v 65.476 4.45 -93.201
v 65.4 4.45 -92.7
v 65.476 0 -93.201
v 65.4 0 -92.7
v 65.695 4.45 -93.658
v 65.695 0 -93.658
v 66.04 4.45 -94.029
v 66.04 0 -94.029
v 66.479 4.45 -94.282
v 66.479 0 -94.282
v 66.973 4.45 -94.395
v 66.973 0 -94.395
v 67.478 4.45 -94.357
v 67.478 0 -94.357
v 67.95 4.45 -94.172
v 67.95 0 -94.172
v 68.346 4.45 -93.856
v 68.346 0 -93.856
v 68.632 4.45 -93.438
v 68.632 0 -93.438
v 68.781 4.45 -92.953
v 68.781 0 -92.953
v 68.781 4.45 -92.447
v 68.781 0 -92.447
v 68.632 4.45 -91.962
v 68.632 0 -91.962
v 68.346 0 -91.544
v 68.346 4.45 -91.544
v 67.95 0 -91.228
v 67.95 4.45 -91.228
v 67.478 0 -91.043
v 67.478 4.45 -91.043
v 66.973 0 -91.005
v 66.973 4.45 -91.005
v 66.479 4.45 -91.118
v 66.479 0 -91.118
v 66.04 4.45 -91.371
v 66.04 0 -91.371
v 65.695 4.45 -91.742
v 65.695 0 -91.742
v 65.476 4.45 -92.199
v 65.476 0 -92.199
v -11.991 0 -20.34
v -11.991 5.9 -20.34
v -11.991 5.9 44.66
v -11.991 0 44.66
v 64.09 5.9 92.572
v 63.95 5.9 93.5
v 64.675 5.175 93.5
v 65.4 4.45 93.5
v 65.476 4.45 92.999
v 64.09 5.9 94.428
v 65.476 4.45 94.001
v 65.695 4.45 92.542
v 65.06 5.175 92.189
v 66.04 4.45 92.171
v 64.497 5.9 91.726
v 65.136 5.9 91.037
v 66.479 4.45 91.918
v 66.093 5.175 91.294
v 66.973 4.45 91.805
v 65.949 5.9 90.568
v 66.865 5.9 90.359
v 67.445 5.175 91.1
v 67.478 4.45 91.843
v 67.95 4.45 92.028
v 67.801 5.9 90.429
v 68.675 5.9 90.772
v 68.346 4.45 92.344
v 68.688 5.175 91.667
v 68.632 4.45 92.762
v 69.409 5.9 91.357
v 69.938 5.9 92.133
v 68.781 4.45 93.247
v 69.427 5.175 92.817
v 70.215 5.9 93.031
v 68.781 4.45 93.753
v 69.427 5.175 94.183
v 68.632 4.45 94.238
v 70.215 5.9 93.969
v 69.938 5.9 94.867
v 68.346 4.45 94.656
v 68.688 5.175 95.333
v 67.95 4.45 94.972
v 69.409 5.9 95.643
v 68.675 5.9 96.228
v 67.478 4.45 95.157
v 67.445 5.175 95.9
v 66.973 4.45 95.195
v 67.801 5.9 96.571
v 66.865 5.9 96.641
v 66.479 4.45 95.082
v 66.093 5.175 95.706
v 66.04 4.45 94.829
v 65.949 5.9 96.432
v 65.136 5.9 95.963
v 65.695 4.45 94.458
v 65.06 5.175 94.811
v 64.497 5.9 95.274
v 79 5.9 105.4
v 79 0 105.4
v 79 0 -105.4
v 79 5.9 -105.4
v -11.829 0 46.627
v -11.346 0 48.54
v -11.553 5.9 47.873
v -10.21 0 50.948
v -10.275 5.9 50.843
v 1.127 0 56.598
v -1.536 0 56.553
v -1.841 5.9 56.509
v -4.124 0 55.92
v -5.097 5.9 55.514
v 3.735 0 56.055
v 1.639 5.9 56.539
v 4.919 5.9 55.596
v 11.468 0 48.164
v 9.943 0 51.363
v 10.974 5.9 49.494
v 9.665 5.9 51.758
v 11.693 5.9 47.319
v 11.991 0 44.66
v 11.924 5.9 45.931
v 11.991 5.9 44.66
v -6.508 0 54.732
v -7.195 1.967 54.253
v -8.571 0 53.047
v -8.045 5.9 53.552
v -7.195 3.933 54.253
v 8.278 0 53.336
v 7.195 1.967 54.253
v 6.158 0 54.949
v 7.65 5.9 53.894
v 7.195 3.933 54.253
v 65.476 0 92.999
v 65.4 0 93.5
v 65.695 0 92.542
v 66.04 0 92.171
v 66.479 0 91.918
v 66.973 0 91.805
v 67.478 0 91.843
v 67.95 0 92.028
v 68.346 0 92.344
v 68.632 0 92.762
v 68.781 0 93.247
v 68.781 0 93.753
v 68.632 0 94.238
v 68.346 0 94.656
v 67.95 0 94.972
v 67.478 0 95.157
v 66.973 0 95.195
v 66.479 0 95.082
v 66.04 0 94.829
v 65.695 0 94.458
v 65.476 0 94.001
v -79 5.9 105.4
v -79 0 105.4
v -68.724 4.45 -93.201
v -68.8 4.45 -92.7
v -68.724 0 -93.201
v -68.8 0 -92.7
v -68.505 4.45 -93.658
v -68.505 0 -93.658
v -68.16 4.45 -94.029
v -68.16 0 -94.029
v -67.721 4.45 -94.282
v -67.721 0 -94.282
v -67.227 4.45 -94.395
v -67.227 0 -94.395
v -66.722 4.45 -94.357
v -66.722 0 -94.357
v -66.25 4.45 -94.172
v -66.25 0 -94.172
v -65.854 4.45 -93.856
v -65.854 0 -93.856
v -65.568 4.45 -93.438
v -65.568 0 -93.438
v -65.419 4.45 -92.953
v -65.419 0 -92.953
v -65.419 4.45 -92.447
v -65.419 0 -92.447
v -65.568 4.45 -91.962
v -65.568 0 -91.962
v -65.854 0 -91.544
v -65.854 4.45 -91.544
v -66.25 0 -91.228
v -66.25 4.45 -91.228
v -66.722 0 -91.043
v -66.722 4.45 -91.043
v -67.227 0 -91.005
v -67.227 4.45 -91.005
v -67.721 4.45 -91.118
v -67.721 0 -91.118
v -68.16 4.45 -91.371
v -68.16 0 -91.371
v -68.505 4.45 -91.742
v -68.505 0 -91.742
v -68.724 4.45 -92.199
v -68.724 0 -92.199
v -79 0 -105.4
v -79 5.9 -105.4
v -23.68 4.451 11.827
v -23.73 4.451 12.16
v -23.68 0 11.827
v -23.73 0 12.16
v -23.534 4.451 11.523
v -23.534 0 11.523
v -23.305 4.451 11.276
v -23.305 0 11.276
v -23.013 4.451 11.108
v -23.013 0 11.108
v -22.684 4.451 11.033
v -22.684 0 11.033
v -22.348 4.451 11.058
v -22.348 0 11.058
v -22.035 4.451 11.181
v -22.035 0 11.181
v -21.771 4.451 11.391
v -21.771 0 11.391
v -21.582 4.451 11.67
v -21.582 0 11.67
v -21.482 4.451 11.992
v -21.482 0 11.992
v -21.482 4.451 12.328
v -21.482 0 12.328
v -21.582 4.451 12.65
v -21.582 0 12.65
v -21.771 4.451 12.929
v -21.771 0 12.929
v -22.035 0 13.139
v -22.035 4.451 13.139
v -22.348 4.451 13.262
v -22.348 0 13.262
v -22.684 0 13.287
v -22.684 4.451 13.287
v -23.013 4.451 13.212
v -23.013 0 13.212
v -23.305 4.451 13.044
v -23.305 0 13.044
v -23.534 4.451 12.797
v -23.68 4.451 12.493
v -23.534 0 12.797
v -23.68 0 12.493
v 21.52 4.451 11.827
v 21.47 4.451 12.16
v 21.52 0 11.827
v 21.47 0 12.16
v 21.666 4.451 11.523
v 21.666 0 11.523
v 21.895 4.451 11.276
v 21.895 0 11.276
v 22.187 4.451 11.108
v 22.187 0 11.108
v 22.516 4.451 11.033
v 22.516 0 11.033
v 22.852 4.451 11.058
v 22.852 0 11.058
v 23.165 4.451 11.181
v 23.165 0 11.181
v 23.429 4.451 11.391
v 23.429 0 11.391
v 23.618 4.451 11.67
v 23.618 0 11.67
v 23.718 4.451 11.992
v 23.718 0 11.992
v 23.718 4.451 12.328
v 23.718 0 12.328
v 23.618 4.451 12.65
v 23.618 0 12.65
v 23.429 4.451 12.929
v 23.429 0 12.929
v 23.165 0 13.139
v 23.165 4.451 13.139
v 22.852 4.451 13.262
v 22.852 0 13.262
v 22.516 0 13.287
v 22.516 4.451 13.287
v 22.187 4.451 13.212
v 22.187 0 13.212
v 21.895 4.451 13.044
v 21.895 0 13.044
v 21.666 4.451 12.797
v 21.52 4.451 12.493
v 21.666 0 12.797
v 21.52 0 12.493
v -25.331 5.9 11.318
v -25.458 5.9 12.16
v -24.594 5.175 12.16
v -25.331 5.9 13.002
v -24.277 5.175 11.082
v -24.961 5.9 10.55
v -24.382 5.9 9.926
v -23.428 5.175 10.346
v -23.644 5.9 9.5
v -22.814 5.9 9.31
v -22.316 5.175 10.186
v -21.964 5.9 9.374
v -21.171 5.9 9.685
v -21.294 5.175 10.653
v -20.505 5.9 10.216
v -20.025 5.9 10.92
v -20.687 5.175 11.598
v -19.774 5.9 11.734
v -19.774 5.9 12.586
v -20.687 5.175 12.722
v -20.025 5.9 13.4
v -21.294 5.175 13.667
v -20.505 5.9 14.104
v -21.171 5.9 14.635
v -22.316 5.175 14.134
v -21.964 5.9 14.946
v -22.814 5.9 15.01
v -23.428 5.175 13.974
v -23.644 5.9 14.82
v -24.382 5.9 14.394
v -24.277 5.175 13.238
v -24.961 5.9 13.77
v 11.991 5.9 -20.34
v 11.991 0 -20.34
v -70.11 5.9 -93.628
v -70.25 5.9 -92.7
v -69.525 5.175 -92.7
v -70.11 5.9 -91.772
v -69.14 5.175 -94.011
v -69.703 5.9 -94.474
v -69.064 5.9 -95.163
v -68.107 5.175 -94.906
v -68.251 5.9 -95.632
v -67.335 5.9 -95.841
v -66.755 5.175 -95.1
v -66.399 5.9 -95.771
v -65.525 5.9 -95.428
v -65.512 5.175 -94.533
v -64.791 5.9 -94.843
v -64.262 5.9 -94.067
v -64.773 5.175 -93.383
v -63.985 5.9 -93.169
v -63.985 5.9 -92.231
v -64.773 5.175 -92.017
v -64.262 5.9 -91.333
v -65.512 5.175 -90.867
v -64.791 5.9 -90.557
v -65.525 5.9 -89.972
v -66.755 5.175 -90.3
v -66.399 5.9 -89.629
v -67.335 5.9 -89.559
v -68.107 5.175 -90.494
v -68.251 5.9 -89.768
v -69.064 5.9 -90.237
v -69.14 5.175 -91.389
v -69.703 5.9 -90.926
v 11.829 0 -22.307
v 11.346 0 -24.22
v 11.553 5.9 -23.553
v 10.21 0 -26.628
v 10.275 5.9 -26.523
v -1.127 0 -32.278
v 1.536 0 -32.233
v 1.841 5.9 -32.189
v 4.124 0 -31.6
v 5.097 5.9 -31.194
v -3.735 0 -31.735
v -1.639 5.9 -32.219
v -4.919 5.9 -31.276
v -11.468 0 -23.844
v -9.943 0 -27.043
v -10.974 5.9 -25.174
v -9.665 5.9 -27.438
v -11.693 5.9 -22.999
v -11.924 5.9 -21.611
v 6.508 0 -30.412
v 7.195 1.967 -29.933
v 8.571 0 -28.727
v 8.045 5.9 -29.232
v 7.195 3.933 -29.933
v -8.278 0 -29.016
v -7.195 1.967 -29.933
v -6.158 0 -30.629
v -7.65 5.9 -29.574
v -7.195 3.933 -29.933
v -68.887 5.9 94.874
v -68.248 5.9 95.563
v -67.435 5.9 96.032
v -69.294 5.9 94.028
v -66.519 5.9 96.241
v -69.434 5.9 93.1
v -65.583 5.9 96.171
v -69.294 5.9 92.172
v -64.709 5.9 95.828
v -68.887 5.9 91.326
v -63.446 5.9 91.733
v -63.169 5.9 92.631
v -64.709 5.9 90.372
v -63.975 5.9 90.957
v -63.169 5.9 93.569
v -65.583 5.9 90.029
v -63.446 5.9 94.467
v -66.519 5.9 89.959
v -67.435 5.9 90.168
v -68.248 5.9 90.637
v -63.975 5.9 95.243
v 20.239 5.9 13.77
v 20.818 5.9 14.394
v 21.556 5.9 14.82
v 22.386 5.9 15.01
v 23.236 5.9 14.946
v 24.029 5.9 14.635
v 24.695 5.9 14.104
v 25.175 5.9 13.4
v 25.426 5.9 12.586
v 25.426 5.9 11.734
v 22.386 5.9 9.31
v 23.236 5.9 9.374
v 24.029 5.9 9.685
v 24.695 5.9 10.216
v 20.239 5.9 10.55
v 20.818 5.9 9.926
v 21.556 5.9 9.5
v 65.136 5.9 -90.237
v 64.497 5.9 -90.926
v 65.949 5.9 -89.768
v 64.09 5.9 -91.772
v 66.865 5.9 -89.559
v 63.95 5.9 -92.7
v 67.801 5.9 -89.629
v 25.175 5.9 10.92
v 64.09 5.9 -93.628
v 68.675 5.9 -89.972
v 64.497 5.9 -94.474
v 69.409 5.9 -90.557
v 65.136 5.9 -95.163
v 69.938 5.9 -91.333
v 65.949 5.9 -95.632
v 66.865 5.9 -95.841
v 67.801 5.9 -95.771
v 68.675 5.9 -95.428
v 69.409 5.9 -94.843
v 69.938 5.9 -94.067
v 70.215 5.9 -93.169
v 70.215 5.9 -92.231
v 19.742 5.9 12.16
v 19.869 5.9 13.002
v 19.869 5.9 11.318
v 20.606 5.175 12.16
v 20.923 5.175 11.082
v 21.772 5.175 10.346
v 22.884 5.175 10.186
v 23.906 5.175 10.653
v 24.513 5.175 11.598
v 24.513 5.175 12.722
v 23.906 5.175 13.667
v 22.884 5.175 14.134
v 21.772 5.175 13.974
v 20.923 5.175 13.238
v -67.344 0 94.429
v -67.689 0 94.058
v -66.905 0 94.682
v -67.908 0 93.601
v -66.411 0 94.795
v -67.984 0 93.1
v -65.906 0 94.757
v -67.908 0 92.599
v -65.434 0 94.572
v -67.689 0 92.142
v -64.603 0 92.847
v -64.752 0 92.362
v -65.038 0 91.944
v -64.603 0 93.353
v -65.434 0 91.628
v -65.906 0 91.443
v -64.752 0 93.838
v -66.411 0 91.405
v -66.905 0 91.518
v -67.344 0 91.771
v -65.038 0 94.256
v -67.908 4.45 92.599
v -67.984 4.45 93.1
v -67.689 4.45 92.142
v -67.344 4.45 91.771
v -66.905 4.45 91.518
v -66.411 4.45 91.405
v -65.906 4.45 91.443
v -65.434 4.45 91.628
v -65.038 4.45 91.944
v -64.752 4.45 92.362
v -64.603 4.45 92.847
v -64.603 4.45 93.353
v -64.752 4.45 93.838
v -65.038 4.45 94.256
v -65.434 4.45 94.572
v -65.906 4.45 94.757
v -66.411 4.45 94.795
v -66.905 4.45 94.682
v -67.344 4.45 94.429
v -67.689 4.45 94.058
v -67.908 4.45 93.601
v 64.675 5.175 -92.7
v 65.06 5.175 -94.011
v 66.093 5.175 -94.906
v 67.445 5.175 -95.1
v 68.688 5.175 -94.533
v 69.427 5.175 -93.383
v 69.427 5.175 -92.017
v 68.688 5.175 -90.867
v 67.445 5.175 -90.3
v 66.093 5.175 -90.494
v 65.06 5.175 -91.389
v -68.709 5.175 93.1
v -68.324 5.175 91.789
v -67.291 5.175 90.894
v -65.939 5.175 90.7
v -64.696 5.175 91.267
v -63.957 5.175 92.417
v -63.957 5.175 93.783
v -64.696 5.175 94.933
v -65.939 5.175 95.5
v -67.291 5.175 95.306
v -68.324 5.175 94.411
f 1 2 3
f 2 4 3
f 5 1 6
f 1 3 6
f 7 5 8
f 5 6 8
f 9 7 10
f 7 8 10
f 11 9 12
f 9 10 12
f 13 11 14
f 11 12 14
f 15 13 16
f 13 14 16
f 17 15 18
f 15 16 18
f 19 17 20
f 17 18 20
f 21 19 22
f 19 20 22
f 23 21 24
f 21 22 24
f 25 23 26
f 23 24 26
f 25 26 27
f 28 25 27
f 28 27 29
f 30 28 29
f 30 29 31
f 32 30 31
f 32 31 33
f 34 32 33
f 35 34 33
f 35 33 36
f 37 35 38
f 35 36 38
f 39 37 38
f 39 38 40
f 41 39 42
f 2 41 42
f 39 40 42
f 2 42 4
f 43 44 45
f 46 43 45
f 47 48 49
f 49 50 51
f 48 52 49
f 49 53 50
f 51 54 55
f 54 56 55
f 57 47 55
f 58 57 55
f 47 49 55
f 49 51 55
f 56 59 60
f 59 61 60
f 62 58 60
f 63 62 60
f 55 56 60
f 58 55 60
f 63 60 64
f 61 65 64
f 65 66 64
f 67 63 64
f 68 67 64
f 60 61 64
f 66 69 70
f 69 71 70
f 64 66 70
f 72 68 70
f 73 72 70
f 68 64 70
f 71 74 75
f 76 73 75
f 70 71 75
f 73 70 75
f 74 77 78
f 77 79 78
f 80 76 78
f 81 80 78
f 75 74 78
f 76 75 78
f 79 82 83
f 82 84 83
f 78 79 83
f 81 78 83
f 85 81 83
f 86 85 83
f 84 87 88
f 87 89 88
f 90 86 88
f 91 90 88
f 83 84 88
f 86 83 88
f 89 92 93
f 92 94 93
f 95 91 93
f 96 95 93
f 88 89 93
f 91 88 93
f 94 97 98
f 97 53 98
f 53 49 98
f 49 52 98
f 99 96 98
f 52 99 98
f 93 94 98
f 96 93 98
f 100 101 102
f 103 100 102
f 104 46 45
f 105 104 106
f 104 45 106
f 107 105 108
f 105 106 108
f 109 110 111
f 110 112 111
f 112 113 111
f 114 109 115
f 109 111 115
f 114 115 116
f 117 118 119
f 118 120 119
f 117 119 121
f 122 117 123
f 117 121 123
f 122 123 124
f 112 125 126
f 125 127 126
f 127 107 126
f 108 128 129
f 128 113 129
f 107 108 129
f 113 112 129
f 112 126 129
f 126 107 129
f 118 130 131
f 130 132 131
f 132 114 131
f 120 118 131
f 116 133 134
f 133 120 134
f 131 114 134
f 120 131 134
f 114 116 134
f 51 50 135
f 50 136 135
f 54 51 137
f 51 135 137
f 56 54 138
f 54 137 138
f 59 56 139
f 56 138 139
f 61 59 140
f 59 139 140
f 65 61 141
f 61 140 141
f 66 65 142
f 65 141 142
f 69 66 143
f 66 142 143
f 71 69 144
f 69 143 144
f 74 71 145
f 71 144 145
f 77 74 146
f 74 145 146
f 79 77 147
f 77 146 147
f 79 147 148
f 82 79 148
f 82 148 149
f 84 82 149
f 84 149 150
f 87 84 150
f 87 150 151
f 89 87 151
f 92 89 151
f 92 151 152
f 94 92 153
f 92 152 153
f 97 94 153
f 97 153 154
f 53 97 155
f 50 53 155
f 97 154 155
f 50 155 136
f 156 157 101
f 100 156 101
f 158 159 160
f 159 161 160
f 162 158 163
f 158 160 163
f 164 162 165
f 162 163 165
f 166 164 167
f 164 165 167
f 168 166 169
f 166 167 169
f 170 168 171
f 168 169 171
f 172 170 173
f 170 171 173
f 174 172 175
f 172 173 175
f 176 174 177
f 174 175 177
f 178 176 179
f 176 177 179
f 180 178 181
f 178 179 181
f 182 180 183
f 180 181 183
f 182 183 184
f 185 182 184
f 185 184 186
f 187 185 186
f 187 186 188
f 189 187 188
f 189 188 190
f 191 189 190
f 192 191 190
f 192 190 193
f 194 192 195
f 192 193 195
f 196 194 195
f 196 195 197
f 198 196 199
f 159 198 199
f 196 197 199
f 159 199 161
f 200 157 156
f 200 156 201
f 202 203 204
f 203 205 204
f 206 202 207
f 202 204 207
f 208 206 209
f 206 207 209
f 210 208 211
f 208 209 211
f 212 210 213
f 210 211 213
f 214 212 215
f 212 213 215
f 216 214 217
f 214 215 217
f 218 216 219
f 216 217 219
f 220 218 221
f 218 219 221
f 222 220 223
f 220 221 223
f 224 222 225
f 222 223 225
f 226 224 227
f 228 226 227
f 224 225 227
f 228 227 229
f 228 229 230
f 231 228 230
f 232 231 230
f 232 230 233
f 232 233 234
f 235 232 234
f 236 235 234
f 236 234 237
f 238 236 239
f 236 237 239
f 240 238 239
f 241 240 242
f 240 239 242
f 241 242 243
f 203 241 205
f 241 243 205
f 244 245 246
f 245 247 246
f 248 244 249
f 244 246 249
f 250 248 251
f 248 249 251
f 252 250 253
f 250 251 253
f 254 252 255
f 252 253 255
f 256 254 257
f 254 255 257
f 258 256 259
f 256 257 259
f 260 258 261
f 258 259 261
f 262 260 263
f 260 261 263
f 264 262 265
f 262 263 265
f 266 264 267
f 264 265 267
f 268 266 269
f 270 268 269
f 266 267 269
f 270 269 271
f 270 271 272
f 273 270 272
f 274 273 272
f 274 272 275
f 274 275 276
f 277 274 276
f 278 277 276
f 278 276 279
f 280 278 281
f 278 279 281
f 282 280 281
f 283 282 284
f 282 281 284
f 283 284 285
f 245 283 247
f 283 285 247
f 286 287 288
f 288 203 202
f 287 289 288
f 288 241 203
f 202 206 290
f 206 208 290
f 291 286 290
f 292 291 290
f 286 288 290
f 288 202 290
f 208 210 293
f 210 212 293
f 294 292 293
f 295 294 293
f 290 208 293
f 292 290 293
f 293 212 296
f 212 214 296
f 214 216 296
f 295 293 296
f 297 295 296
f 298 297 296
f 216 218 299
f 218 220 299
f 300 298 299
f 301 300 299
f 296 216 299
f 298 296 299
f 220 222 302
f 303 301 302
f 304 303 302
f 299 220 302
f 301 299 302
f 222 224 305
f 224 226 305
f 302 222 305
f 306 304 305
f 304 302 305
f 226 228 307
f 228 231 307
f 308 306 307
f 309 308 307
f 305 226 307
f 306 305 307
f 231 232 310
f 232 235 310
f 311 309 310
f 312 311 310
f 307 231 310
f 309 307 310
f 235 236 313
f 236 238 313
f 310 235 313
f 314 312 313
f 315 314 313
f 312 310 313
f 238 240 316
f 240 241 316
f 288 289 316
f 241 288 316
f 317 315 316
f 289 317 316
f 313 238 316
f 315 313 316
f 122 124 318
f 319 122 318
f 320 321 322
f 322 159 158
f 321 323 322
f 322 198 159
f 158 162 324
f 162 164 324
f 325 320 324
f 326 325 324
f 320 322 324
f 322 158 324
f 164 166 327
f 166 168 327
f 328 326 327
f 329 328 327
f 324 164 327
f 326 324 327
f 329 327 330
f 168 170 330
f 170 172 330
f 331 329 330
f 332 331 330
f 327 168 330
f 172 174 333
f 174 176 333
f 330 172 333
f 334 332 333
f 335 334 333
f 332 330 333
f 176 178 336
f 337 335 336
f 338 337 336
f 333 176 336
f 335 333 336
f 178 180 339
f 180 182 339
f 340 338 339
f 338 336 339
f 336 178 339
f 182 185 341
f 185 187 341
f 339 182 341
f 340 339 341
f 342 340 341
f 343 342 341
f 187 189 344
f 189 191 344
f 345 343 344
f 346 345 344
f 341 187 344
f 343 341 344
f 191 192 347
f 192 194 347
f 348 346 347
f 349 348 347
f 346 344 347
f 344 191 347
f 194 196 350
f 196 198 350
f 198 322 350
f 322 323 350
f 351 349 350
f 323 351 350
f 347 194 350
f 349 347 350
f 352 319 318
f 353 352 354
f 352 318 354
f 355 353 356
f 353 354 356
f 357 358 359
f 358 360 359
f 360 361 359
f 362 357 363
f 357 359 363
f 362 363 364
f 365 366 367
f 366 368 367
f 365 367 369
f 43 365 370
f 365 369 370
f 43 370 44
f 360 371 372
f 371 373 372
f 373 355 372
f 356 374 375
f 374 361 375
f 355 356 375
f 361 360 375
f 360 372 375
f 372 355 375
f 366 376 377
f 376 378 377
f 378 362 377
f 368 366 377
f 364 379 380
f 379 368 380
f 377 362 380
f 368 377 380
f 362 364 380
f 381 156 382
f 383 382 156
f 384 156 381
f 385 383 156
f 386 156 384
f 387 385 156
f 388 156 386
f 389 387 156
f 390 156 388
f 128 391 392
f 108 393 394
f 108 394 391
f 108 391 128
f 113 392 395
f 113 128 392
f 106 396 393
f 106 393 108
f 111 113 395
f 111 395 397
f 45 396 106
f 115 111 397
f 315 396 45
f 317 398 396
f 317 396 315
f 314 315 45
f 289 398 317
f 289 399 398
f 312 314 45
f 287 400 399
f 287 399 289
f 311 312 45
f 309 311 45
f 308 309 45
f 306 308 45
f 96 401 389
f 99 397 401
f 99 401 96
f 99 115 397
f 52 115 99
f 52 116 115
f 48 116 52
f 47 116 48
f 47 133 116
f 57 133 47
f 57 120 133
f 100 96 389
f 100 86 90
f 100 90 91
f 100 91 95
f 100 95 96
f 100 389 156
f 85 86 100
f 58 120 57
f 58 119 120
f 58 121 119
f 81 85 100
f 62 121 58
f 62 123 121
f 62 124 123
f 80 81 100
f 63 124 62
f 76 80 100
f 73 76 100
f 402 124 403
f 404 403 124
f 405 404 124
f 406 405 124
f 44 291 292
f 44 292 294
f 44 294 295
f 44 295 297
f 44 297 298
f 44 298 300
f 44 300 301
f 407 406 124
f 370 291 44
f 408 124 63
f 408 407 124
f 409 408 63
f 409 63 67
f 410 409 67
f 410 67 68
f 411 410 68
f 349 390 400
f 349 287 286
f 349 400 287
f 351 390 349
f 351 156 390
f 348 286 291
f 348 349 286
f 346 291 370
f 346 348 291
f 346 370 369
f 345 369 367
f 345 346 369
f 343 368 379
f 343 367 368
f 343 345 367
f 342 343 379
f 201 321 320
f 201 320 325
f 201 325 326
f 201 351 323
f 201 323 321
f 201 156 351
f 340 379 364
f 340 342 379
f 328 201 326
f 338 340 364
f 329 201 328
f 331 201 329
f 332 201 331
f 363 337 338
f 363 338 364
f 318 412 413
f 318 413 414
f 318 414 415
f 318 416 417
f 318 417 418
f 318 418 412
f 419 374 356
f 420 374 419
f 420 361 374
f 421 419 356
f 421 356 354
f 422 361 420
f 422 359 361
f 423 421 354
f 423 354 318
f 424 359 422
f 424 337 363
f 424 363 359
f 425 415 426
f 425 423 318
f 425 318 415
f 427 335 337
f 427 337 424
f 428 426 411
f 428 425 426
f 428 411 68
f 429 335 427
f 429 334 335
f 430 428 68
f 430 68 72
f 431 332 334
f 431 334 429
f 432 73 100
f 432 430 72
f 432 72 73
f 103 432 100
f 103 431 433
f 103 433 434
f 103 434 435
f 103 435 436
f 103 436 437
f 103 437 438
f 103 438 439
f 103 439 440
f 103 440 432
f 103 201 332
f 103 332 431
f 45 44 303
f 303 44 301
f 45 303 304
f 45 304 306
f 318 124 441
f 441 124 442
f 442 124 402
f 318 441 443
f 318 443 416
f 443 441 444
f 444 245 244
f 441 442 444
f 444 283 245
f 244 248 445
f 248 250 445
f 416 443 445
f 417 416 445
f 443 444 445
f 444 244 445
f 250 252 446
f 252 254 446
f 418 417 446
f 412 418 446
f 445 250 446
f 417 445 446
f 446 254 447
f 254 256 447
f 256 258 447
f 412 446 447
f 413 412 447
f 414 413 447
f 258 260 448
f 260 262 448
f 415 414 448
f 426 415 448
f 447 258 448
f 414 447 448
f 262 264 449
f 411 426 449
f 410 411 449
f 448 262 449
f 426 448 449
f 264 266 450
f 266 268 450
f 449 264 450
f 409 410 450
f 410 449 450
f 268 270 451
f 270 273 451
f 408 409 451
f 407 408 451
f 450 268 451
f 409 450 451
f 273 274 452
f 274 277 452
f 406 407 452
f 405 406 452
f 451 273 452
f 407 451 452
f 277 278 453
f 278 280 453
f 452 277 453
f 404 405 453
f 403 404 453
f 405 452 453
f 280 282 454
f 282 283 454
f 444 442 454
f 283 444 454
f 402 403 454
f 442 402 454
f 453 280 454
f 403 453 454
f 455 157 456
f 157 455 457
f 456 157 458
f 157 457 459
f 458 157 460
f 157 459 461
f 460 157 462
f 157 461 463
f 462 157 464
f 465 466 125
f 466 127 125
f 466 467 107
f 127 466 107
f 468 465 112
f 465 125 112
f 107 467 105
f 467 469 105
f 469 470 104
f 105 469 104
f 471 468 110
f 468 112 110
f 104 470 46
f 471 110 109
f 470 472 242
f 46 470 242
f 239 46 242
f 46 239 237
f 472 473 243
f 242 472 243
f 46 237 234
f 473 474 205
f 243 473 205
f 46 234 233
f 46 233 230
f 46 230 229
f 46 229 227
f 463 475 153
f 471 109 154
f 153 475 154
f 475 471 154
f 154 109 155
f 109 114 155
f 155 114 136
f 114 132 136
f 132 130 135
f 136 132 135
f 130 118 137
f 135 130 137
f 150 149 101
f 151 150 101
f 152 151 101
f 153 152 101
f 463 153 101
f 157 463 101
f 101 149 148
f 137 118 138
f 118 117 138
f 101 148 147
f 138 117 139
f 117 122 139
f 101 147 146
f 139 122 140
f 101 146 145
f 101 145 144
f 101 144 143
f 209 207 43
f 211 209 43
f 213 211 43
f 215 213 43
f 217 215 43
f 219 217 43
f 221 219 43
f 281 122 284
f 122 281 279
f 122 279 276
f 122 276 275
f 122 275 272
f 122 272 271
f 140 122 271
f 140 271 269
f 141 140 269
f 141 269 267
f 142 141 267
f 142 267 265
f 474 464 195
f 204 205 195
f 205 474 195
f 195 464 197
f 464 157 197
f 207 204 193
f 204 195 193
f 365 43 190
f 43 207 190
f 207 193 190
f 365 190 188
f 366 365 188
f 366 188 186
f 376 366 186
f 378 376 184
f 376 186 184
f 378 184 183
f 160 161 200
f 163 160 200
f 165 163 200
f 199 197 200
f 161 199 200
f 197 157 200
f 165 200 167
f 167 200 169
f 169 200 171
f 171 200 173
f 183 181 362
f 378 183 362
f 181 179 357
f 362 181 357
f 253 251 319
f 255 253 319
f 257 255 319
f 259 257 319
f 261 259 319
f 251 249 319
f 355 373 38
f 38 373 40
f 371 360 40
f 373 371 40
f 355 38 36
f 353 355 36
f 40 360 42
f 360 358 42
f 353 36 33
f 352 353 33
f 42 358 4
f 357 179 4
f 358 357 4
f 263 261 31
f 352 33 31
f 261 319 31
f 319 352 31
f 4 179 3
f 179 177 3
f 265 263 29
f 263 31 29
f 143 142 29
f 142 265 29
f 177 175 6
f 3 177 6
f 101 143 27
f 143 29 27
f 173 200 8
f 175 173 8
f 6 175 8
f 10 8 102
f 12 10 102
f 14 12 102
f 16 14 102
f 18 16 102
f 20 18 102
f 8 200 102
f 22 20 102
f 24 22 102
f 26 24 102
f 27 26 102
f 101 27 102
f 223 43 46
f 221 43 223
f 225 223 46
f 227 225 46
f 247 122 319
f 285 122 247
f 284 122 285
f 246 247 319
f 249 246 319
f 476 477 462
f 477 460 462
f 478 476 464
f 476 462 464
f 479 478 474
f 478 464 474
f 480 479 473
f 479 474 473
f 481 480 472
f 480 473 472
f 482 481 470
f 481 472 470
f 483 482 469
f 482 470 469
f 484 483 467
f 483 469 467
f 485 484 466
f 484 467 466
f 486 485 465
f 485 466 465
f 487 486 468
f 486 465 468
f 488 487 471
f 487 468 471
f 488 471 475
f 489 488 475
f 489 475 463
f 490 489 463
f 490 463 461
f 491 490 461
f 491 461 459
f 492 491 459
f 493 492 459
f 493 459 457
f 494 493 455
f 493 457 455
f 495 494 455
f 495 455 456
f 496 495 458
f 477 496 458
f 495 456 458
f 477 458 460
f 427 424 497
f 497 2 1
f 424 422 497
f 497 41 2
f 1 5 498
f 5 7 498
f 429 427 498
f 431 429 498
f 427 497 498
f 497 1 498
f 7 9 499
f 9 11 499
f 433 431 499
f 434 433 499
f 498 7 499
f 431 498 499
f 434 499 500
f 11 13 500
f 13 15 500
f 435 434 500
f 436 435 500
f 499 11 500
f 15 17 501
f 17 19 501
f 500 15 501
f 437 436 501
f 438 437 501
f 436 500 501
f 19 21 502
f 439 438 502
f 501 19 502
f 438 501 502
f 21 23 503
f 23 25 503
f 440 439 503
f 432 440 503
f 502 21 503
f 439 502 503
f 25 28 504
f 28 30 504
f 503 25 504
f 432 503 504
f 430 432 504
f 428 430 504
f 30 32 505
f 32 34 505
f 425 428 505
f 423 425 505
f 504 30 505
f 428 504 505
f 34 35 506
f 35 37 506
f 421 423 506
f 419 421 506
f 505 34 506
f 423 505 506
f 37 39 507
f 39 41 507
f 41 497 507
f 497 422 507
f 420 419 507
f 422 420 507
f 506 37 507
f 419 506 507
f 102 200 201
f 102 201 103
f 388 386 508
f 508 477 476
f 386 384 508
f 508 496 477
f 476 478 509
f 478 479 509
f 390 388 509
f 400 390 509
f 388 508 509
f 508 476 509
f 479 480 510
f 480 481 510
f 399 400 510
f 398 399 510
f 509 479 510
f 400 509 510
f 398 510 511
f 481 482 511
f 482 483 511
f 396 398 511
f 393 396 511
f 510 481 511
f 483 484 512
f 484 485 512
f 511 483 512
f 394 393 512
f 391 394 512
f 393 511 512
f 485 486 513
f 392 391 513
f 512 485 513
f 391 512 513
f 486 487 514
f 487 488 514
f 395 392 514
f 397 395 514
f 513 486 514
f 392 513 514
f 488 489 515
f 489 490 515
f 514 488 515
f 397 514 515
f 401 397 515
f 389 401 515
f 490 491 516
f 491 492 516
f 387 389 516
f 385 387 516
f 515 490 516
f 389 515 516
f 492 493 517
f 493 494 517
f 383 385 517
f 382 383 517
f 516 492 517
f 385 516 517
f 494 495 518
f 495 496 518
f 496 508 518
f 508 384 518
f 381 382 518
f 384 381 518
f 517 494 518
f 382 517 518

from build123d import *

# Parameters (mm, degrees)
SKETCH1_W                                       = 158
SKETCH1_H                                       = 210.8
BOSS_EXTRUDE1_DEPTH                             = 5.9
CSK_FOR_M3_FLAT_HEAD_MACHINE_SCREW1_D           = 3.4
CSK_FOR_M3_FLAT_HEAD_MACHINE_SCREW1_DEPTH       = 10
CSK_FOR_M3_FLAT_HEAD_MACHINE_SCREW1_CSINK_D     = 6.3
CSK_FOR_M3_FLAT_HEAD_MACHINE_SCREW1_CSINK_ANGLE = 90
CSK_FOR_M3_FLAT_HEAD_MACHINE_SCREW1_TIP         = 1.021463052
CUT_EXTRUDE1_DEPTH                              = 132.852076207
F_4_40_TAPPED_HOLE1_D                           = 2.2606
F_4_40_TAPPED_HOLE1_DEPTH                       = 10
F_4_40_TAPPED_HOLE1_CSINK_D                     = 5.715
F_4_40_TAPPED_HOLE1_CSINK_ANGLE                 = 100
F_4_40_TAPPED_HOLE1_TIP                         = 0.679152758


with BuildPart() as part:
    # Sketch1 → Boss-Extrude1 (new body)
    with BuildSketch(Plane(origin=(0, 0, 0), x_dir=(1, 0, 0), z_dir=(0, 1, 0))):
        Rectangle(SKETCH1_W, SKETCH1_H)
    extrude(amount=BOSS_EXTRUDE1_DEPTH)

    # CSK for M3 Flat Head Machine Screw1
    with Locations(Plane(origin=(0, 5.9, 0), x_dir=(1, 0, 0), z_dir=(0, 1, 0))):
        with Locations((67.1, 92.7), (67.1, -93.5), (-66.28397659, -93.1), (-67.1, 92.7)):
            CounterSinkHole(CSK_FOR_M3_FLAT_HEAD_MACHINE_SCREW1_D / 2, CSK_FOR_M3_FLAT_HEAD_MACHINE_SCREW1_CSINK_D / 2, depth=CSK_FOR_M3_FLAT_HEAD_MACHINE_SCREW1_DEPTH, counter_sink_angle=CSK_FOR_M3_FLAT_HEAD_MACHINE_SCREW1_CSINK_ANGLE)
            with Locations((0, 0, -(CSK_FOR_M3_FLAT_HEAD_MACHINE_SCREW1_DEPTH + CSK_FOR_M3_FLAT_HEAD_MACHINE_SCREW1_TIP / 2))):  # 118° drill point
                Cone(0, CSK_FOR_M3_FLAT_HEAD_MACHINE_SCREW1_D / 2, CSK_FOR_M3_FLAT_HEAD_MACHINE_SCREW1_TIP, mode=Mode.SUBTRACT)

    # Sketch4 → Cut-Extrude1 (cut, through all)
    with BuildSketch(Plane(origin=(0, 5.9, 0), x_dir=(1, 0, 0), z_dir=(0, 1, 0))):
        with BuildLine():
            Line((-11.991361004, 20.34), (-11.991361004, -44.66))
            add(Edge.make_bspline(
                [(-11.991361004, -44.66), (-11.991361004, -68.642722008), (11.991361004, -68.642722008), (11.991361004, -44.66)],
                knots=[0, 0, 0, 0, 1, 1, 1, 1], degree=3, weights=[1, 0.333333333, 0.333333333, 1]))
            Line((11.991361004, -44.66), (11.991361004, 20.34))
            add(Edge.make_bspline(
                [(11.991361004, 20.34), (11.991361004, 44.322722008), (-11.991361004, 44.322722008), (-11.991361004, 20.34)],
                knots=[0, 0, 0, 0, 1, 1, 1, 1], degree=3, weights=[1, 0.333333333, 0.333333333, 1]))
        make_face()
    extrude(amount=-CUT_EXTRUDE1_DEPTH, mode=Mode.SUBTRACT)

    # #4-40 Tapped Hole1
    with Locations(Plane(origin=(0, 5.9, 0), x_dir=(1, 0, 0), z_dir=(0, 1, 0))):
        with Locations((-22.6, -12.16), (22.6, -12.16)):
            CounterSinkHole(F_4_40_TAPPED_HOLE1_D / 2, F_4_40_TAPPED_HOLE1_CSINK_D / 2, depth=F_4_40_TAPPED_HOLE1_DEPTH, counter_sink_angle=F_4_40_TAPPED_HOLE1_CSINK_ANGLE)
            with Locations((0, 0, -(F_4_40_TAPPED_HOLE1_DEPTH + F_4_40_TAPPED_HOLE1_TIP / 2))):  # 118° drill point
                Cone(0, F_4_40_TAPPED_HOLE1_D / 2, F_4_40_TAPPED_HOLE1_TIP, mode=Mode.SUBTRACT)


solid = part.part
